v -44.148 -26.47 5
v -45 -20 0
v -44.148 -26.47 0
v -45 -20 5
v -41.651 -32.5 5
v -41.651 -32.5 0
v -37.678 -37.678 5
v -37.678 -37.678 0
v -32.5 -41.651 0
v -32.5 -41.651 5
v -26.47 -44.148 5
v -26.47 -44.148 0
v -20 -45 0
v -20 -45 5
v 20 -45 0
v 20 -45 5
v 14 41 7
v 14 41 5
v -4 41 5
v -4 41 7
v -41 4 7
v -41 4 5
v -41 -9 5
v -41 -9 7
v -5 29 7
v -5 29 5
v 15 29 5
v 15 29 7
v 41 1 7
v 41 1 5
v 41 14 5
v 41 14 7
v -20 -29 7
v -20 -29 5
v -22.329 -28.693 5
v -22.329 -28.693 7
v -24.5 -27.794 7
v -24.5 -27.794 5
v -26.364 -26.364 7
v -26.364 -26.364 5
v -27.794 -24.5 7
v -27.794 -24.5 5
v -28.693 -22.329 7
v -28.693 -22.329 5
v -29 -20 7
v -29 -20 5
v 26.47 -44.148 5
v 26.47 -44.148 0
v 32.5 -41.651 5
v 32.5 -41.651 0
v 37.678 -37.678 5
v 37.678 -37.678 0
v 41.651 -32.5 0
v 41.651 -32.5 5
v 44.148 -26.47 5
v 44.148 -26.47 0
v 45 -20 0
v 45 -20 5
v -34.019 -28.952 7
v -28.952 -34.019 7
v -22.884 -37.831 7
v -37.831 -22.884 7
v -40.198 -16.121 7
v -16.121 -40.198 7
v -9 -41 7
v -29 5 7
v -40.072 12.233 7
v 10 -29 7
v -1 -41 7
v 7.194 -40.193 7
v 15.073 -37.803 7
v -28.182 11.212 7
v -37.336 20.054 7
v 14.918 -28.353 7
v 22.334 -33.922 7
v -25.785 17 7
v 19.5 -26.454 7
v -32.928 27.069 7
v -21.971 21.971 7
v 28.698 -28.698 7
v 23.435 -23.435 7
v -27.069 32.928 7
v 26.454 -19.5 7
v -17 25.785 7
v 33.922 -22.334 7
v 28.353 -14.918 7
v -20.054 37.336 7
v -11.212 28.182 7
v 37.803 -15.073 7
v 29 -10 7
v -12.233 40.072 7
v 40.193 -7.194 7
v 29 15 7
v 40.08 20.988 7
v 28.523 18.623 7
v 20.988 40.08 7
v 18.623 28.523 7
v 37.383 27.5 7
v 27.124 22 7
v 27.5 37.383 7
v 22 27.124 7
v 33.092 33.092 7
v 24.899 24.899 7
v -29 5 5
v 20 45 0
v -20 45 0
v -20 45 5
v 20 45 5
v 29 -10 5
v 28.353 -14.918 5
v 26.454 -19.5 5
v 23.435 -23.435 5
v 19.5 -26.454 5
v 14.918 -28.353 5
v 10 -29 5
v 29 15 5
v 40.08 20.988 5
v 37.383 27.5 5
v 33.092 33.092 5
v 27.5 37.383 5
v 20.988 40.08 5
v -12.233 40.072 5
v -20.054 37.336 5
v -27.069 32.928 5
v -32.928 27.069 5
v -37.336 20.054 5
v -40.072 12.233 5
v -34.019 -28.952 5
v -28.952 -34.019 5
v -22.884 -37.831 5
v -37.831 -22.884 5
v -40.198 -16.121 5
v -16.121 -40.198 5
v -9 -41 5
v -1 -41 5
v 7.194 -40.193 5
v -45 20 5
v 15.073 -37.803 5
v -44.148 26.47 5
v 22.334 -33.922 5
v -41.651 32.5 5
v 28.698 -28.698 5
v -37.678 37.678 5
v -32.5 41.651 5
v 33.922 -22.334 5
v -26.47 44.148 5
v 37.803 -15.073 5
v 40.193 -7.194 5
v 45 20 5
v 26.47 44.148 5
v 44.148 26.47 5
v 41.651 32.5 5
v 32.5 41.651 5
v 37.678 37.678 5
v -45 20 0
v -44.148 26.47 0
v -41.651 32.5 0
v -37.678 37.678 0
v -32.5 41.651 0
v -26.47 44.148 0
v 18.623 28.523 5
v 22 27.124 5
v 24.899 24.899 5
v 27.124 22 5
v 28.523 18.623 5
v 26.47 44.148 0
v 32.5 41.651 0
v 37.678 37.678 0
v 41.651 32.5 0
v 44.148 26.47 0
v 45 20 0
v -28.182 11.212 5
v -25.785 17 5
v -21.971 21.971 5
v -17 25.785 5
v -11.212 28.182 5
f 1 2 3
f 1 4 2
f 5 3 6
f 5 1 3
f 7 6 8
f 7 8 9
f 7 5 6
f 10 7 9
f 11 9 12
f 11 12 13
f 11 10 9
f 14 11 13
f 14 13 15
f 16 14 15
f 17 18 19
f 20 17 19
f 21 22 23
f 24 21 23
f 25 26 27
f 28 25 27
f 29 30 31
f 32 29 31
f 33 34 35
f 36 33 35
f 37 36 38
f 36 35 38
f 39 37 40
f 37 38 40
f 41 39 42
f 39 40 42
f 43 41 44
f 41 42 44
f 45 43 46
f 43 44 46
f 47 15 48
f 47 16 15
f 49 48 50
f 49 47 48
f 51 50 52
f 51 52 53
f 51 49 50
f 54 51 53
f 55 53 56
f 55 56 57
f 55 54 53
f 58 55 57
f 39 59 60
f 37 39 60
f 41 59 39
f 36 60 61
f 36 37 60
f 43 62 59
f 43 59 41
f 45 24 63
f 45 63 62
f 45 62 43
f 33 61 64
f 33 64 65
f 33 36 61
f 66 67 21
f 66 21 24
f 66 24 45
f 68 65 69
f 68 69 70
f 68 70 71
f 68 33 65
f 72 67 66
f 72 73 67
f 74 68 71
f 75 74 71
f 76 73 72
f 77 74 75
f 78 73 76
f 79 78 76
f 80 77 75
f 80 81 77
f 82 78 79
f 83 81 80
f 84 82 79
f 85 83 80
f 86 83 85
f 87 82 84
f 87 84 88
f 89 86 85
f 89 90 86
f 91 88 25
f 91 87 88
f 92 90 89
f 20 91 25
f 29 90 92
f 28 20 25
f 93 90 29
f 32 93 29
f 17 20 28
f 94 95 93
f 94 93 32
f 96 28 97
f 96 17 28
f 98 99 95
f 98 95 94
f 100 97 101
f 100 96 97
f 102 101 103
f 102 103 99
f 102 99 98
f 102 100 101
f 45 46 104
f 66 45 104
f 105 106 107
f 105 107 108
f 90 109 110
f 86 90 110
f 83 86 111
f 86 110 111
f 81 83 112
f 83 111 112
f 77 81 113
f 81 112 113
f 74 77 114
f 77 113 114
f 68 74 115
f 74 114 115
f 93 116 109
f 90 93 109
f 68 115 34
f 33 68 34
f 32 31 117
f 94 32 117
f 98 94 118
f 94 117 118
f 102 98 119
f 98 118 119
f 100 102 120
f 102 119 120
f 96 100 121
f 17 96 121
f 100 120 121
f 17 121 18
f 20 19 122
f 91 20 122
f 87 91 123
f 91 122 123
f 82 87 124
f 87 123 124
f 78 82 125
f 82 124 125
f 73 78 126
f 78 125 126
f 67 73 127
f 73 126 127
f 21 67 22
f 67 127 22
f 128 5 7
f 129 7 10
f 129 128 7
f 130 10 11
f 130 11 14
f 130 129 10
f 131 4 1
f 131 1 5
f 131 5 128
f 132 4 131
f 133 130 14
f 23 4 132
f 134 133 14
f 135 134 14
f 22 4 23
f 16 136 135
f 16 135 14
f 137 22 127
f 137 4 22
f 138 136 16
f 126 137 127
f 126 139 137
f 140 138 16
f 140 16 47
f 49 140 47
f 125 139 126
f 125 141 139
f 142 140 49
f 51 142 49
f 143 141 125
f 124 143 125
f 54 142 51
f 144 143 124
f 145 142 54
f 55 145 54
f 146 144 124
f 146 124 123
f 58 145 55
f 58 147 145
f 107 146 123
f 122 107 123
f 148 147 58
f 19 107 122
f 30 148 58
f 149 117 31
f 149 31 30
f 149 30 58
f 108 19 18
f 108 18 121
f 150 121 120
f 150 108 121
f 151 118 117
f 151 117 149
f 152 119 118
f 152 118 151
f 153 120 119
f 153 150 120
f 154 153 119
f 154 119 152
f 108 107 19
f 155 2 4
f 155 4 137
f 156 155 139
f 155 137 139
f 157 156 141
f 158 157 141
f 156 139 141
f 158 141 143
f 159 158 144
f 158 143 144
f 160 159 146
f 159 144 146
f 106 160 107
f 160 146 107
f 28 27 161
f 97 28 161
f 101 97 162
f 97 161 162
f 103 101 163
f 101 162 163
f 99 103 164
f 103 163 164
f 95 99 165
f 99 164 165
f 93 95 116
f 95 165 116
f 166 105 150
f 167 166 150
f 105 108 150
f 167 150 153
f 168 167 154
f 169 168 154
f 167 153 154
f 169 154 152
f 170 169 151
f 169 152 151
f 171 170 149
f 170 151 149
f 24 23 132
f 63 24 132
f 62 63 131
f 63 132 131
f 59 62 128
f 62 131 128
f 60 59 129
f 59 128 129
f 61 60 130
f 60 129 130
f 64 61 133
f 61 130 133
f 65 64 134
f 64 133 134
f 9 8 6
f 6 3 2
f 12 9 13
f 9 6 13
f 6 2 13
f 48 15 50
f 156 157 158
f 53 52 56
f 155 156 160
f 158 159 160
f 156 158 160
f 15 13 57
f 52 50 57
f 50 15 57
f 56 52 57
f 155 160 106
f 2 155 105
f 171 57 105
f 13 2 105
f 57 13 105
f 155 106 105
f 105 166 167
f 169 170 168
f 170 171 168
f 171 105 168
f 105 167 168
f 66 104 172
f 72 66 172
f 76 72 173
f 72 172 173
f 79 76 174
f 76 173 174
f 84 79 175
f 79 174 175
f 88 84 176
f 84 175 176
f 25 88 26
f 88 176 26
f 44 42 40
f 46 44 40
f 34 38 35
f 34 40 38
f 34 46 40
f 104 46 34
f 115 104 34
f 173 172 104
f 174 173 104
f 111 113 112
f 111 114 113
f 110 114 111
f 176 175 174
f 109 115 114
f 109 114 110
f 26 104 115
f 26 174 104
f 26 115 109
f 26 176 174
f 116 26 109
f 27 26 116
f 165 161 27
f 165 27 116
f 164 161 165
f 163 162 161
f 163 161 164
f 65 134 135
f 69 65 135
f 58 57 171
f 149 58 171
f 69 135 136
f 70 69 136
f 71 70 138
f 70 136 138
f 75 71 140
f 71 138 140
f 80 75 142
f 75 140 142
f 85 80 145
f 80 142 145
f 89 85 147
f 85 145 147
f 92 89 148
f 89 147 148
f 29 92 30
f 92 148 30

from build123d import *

# Parameters (mm, degrees)
F0_W     = 90
F0_H     = 90
F1_DEPTH = 5
F3_DEPTH = 2
F4_R     = 25


with BuildPart() as f1:
    # F0 (on Top) → F1 (new body)
    with BuildSketch(Plane.XY):
        Rectangle(F0_W, F0_H)
    extrude(amount=F1_DEPTH)

    # F2 (on face) → F3 (join)
    with BuildSketch(Plane.XY.offset(5)):
        with BuildLine():
            Line((14, 41), (-4, 41))
            ThreePointArc((-4, 41), (-30.162951, 30.162951), (-41, 4))
            Line((-41, 4), (-41, -9))
            ThreePointArc((-41, -9), (-31.627417, -31.627417), (-9, -41))
            Line((-9, -41), (-1, -41))
            ThreePointArc((-1, -41), (28.698485, -28.698485), (41, 1))
            Line((41, 1), (41, 14))
            ThreePointArc((41, 14), (33.091883, 33.091883), (14, 41))
        make_face()
        with BuildLine():
            ThreePointArc((-29, 5), (-21.970563, 21.970563), (-5, 29))
            Line((-5, 29), (15, 29))
            ThreePointArc((15, 29), (24.899495, 24.899495), (29, 15))
            Line((29, 15), (29, -10))
            ThreePointArc((29, -10), (23.435029, -23.435029), (10, -29))
            Line((10, -29), (-20, -29))
            ThreePointArc((-20, -29), (-26.363961, -26.363961), (-29, -20))
            Line((-29, -20), (-29, 5))
        make_face(mode=Mode.SUBTRACT)
    extrude(amount=F3_DEPTH)

    # F4
    f4_edges = [f1.edges().sort_by_distance(p)[0] for p in [
        (-45, -45, 2.5),
        (45, -45, 2.5),
        (45, 45, 2.5),
        (-45, 45, 2.5),
    ]]
    fillet(f4_edges, radius=F4_R)


solid = f1.part
